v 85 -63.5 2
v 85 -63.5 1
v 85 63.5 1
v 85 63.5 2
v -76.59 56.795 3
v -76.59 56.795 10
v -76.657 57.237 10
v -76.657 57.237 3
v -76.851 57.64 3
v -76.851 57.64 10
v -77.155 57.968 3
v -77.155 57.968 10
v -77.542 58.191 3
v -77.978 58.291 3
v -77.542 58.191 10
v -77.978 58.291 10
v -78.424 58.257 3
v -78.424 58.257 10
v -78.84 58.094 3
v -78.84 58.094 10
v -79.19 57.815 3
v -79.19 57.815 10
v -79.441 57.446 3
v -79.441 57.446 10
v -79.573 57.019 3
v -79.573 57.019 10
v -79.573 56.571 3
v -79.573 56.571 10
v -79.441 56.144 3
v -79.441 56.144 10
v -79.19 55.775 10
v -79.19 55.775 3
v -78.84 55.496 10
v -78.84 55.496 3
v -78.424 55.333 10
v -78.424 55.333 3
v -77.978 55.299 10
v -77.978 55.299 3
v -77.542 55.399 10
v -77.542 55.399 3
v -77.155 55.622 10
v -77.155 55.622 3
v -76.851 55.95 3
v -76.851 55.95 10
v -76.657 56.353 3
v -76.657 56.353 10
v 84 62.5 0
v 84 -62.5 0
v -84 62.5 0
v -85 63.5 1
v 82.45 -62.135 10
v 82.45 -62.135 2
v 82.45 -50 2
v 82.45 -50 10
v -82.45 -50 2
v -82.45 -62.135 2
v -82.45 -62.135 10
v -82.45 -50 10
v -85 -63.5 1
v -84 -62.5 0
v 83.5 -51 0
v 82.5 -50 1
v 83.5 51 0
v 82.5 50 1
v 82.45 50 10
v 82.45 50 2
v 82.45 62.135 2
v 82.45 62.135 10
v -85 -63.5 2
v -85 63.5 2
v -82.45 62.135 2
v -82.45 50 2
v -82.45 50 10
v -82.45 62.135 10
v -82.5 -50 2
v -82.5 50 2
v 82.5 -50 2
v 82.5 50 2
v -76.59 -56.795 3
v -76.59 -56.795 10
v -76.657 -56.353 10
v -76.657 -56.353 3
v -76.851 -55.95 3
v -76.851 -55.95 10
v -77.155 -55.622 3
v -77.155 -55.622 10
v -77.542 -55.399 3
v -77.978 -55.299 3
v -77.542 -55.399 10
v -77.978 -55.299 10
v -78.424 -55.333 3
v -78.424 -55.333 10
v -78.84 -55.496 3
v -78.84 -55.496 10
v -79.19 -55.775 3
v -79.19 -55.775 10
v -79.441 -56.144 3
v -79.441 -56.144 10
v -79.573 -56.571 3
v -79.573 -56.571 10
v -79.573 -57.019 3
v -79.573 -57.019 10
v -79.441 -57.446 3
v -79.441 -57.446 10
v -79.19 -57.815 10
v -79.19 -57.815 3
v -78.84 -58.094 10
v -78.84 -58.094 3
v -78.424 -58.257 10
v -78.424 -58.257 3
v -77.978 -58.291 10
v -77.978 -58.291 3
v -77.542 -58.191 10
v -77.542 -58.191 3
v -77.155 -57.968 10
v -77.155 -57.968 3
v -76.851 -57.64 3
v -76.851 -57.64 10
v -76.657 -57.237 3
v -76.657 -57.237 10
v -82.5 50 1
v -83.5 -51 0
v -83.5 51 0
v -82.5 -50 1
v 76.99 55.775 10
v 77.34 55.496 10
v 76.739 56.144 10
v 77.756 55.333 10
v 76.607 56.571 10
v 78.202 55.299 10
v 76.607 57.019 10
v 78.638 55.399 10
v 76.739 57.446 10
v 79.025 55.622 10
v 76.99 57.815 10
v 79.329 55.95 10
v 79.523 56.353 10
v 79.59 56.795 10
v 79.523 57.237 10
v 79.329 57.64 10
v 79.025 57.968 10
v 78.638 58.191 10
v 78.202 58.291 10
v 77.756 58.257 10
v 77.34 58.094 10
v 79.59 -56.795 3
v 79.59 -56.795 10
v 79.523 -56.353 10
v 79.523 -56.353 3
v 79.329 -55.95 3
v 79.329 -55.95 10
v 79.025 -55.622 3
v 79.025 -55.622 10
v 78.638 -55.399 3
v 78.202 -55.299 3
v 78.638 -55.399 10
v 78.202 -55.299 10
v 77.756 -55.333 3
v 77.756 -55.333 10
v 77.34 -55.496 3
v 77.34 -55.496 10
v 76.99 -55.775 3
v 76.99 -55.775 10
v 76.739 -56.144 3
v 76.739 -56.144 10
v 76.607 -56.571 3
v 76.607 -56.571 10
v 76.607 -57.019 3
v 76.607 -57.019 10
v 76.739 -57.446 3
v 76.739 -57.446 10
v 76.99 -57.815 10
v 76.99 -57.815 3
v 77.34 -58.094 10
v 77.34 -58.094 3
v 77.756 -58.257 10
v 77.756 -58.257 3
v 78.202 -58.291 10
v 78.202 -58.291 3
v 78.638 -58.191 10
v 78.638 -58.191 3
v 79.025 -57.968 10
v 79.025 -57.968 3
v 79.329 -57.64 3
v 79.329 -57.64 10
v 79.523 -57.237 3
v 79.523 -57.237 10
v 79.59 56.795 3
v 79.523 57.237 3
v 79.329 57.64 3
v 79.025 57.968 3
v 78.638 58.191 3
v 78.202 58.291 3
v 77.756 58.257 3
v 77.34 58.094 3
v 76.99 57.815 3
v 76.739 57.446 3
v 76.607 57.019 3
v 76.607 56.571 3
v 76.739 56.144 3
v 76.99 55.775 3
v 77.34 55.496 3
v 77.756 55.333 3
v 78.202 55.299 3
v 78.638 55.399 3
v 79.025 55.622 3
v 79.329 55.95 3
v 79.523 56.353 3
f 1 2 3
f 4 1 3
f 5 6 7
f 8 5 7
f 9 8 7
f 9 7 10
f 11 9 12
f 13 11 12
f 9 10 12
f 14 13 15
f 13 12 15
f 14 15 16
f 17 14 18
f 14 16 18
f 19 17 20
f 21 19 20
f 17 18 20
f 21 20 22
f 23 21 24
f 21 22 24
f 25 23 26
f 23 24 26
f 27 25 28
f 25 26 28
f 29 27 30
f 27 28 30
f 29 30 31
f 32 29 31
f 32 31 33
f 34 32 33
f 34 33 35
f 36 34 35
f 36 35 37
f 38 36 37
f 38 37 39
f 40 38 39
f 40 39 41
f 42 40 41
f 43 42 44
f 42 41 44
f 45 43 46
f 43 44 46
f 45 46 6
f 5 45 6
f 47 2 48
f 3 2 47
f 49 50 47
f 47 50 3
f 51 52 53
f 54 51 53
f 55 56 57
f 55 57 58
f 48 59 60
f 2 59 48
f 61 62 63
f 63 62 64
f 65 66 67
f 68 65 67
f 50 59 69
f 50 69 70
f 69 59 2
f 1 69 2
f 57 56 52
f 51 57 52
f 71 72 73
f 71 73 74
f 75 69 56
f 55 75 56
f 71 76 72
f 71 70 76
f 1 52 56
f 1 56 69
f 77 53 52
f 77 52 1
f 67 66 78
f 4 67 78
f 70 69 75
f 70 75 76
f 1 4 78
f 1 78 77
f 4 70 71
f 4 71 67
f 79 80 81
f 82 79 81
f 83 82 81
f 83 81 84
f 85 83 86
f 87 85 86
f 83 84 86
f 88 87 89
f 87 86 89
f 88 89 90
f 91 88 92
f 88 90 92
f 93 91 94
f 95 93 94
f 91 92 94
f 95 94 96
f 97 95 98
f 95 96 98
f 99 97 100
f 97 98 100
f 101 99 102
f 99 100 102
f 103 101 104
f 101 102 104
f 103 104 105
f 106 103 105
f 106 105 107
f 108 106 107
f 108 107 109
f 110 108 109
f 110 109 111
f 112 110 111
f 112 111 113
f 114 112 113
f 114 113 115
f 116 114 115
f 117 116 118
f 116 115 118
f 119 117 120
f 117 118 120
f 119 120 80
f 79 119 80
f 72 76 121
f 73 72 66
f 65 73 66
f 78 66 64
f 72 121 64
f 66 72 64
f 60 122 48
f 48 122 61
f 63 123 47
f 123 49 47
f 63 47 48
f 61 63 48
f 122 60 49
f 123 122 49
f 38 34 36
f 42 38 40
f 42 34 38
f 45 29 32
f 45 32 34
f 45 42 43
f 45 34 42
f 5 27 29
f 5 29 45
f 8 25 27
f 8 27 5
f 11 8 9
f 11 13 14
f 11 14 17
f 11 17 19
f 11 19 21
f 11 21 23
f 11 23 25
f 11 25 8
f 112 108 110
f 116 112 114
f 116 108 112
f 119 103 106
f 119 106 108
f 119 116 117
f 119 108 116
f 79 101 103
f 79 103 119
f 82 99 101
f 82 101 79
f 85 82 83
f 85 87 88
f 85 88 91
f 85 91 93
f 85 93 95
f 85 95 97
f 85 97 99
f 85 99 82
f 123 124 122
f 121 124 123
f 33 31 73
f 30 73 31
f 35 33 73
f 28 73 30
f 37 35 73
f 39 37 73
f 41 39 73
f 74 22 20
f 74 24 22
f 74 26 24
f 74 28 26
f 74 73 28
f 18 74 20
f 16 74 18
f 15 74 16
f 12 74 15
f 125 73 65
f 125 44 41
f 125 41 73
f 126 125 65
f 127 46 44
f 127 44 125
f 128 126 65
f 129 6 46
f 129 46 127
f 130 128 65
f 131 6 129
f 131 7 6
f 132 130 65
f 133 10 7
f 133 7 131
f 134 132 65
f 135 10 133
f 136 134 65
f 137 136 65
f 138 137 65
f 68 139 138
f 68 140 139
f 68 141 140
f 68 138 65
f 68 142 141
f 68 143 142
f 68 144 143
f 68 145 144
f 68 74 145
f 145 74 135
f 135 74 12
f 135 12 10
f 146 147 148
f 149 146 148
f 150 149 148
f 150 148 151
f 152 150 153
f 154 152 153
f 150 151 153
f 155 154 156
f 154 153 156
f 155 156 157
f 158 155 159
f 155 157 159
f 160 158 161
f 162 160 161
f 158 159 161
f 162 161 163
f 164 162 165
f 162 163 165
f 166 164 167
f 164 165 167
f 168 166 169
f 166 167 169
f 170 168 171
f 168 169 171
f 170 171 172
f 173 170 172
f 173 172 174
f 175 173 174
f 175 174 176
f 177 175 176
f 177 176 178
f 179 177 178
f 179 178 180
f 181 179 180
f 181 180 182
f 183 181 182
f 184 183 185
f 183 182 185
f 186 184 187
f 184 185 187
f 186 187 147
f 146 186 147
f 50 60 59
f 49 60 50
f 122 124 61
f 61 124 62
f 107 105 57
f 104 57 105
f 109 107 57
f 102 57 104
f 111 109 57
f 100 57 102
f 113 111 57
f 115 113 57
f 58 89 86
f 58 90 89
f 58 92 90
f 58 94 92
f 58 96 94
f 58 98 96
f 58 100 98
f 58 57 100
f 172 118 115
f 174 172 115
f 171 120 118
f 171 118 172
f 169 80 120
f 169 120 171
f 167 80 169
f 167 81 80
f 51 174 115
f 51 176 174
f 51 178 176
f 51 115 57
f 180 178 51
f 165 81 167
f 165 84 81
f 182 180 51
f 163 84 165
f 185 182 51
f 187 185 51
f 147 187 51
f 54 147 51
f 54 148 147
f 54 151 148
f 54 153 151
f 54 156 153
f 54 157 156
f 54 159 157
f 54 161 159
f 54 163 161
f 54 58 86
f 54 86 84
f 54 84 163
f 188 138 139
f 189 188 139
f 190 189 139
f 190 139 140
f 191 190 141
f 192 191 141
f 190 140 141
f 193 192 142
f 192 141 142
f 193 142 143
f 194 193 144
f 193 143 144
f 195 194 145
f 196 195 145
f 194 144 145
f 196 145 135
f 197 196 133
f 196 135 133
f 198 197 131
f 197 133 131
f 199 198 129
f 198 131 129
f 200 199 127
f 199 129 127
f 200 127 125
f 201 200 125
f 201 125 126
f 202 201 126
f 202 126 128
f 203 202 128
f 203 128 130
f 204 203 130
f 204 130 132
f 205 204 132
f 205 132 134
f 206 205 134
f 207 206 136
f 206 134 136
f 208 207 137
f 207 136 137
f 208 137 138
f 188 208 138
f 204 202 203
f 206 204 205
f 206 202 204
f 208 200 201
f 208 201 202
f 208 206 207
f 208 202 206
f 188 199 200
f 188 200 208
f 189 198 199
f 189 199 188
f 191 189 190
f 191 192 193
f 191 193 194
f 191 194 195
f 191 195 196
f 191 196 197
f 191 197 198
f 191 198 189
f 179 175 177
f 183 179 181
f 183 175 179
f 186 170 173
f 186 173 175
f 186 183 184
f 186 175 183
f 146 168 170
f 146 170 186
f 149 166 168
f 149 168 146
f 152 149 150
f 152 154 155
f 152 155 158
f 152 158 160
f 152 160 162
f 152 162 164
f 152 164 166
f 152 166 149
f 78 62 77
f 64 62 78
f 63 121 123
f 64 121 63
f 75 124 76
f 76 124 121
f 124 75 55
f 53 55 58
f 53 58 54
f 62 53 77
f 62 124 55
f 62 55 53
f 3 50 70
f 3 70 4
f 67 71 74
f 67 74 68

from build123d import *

# Parameters (mm, degrees)
SKETCH001_W   = 180
SKETCH001_H   = 136
SKETCH001_W_2 = 164.9
SKETCH001_H_2 = 124.27
PAD001_DEPTH  = 10
SKETCH_W      = 170
SKETCH_H      = 127
SKETCH_W_2    = 165
SKETCH_H_2    = 100
PAD_DEPTH     = 10
SKETCH002_R   = 1.5
POCKET_DEPTH  = 7
CHAMFER_SIZE  = 1


with BuildPart() as body001:
    # Sketch001 → Pad001 (new body)
    with BuildSketch(Plane.XY):
        Rectangle(SKETCH001_W, SKETCH001_H)
        Rectangle(SKETCH001_W_2, SKETCH001_H_2, mode=Mode.SUBTRACT)
    extrude(amount=PAD001_DEPTH)


with BuildPart() as body001_1:
    # Body001 placement: moved
    add(body001.part.moved(Location((0, 0, 2))))


with BuildPart() as bezel:
    # Sketch → Pad (new body)
    with BuildSketch(Plane.XY):
        Rectangle(SKETCH_W, SKETCH_H)
        Rectangle(SKETCH_W_2, SKETCH_H_2, mode=Mode.SUBTRACT)
    extrude(amount=PAD_DEPTH)

    # Boolean: cut Body001
    add(body001_1.part, mode=Mode.SUBTRACT)

    # Sketch002 (on Face18 of Boolean) → Pocket (cut)
    with BuildSketch(Plane.XY.offset(10)):
        with Locations((-78.09, 56.795)):
            Circle(SKETCH002_R)
        with Locations((78.09, 56.795)):
            Circle(SKETCH002_R)
        with Locations((78.09, -56.795)):
            Circle(SKETCH002_R)
        with Locations((-78.09, -56.795)):
            Circle(SKETCH002_R)
    extrude(amount=-POCKET_DEPTH, mode=Mode.SUBTRACT)

    # Chamfer
    chamfer_edges = [bezel.edges().sort_by_distance(p)[0] for p in [
        (82.5, 0, 0),
        (0, -50, 0),
        (0, -63.5, 0),
        (85, 0, 0),
        (0, 63.5, 0),
        (-85, 0, 0),
        (0, 50, 0),
        (-82.5, 0, 0),
    ]]
    chamfer(chamfer_edges, length=CHAMFER_SIZE)


solid = bezel.part
